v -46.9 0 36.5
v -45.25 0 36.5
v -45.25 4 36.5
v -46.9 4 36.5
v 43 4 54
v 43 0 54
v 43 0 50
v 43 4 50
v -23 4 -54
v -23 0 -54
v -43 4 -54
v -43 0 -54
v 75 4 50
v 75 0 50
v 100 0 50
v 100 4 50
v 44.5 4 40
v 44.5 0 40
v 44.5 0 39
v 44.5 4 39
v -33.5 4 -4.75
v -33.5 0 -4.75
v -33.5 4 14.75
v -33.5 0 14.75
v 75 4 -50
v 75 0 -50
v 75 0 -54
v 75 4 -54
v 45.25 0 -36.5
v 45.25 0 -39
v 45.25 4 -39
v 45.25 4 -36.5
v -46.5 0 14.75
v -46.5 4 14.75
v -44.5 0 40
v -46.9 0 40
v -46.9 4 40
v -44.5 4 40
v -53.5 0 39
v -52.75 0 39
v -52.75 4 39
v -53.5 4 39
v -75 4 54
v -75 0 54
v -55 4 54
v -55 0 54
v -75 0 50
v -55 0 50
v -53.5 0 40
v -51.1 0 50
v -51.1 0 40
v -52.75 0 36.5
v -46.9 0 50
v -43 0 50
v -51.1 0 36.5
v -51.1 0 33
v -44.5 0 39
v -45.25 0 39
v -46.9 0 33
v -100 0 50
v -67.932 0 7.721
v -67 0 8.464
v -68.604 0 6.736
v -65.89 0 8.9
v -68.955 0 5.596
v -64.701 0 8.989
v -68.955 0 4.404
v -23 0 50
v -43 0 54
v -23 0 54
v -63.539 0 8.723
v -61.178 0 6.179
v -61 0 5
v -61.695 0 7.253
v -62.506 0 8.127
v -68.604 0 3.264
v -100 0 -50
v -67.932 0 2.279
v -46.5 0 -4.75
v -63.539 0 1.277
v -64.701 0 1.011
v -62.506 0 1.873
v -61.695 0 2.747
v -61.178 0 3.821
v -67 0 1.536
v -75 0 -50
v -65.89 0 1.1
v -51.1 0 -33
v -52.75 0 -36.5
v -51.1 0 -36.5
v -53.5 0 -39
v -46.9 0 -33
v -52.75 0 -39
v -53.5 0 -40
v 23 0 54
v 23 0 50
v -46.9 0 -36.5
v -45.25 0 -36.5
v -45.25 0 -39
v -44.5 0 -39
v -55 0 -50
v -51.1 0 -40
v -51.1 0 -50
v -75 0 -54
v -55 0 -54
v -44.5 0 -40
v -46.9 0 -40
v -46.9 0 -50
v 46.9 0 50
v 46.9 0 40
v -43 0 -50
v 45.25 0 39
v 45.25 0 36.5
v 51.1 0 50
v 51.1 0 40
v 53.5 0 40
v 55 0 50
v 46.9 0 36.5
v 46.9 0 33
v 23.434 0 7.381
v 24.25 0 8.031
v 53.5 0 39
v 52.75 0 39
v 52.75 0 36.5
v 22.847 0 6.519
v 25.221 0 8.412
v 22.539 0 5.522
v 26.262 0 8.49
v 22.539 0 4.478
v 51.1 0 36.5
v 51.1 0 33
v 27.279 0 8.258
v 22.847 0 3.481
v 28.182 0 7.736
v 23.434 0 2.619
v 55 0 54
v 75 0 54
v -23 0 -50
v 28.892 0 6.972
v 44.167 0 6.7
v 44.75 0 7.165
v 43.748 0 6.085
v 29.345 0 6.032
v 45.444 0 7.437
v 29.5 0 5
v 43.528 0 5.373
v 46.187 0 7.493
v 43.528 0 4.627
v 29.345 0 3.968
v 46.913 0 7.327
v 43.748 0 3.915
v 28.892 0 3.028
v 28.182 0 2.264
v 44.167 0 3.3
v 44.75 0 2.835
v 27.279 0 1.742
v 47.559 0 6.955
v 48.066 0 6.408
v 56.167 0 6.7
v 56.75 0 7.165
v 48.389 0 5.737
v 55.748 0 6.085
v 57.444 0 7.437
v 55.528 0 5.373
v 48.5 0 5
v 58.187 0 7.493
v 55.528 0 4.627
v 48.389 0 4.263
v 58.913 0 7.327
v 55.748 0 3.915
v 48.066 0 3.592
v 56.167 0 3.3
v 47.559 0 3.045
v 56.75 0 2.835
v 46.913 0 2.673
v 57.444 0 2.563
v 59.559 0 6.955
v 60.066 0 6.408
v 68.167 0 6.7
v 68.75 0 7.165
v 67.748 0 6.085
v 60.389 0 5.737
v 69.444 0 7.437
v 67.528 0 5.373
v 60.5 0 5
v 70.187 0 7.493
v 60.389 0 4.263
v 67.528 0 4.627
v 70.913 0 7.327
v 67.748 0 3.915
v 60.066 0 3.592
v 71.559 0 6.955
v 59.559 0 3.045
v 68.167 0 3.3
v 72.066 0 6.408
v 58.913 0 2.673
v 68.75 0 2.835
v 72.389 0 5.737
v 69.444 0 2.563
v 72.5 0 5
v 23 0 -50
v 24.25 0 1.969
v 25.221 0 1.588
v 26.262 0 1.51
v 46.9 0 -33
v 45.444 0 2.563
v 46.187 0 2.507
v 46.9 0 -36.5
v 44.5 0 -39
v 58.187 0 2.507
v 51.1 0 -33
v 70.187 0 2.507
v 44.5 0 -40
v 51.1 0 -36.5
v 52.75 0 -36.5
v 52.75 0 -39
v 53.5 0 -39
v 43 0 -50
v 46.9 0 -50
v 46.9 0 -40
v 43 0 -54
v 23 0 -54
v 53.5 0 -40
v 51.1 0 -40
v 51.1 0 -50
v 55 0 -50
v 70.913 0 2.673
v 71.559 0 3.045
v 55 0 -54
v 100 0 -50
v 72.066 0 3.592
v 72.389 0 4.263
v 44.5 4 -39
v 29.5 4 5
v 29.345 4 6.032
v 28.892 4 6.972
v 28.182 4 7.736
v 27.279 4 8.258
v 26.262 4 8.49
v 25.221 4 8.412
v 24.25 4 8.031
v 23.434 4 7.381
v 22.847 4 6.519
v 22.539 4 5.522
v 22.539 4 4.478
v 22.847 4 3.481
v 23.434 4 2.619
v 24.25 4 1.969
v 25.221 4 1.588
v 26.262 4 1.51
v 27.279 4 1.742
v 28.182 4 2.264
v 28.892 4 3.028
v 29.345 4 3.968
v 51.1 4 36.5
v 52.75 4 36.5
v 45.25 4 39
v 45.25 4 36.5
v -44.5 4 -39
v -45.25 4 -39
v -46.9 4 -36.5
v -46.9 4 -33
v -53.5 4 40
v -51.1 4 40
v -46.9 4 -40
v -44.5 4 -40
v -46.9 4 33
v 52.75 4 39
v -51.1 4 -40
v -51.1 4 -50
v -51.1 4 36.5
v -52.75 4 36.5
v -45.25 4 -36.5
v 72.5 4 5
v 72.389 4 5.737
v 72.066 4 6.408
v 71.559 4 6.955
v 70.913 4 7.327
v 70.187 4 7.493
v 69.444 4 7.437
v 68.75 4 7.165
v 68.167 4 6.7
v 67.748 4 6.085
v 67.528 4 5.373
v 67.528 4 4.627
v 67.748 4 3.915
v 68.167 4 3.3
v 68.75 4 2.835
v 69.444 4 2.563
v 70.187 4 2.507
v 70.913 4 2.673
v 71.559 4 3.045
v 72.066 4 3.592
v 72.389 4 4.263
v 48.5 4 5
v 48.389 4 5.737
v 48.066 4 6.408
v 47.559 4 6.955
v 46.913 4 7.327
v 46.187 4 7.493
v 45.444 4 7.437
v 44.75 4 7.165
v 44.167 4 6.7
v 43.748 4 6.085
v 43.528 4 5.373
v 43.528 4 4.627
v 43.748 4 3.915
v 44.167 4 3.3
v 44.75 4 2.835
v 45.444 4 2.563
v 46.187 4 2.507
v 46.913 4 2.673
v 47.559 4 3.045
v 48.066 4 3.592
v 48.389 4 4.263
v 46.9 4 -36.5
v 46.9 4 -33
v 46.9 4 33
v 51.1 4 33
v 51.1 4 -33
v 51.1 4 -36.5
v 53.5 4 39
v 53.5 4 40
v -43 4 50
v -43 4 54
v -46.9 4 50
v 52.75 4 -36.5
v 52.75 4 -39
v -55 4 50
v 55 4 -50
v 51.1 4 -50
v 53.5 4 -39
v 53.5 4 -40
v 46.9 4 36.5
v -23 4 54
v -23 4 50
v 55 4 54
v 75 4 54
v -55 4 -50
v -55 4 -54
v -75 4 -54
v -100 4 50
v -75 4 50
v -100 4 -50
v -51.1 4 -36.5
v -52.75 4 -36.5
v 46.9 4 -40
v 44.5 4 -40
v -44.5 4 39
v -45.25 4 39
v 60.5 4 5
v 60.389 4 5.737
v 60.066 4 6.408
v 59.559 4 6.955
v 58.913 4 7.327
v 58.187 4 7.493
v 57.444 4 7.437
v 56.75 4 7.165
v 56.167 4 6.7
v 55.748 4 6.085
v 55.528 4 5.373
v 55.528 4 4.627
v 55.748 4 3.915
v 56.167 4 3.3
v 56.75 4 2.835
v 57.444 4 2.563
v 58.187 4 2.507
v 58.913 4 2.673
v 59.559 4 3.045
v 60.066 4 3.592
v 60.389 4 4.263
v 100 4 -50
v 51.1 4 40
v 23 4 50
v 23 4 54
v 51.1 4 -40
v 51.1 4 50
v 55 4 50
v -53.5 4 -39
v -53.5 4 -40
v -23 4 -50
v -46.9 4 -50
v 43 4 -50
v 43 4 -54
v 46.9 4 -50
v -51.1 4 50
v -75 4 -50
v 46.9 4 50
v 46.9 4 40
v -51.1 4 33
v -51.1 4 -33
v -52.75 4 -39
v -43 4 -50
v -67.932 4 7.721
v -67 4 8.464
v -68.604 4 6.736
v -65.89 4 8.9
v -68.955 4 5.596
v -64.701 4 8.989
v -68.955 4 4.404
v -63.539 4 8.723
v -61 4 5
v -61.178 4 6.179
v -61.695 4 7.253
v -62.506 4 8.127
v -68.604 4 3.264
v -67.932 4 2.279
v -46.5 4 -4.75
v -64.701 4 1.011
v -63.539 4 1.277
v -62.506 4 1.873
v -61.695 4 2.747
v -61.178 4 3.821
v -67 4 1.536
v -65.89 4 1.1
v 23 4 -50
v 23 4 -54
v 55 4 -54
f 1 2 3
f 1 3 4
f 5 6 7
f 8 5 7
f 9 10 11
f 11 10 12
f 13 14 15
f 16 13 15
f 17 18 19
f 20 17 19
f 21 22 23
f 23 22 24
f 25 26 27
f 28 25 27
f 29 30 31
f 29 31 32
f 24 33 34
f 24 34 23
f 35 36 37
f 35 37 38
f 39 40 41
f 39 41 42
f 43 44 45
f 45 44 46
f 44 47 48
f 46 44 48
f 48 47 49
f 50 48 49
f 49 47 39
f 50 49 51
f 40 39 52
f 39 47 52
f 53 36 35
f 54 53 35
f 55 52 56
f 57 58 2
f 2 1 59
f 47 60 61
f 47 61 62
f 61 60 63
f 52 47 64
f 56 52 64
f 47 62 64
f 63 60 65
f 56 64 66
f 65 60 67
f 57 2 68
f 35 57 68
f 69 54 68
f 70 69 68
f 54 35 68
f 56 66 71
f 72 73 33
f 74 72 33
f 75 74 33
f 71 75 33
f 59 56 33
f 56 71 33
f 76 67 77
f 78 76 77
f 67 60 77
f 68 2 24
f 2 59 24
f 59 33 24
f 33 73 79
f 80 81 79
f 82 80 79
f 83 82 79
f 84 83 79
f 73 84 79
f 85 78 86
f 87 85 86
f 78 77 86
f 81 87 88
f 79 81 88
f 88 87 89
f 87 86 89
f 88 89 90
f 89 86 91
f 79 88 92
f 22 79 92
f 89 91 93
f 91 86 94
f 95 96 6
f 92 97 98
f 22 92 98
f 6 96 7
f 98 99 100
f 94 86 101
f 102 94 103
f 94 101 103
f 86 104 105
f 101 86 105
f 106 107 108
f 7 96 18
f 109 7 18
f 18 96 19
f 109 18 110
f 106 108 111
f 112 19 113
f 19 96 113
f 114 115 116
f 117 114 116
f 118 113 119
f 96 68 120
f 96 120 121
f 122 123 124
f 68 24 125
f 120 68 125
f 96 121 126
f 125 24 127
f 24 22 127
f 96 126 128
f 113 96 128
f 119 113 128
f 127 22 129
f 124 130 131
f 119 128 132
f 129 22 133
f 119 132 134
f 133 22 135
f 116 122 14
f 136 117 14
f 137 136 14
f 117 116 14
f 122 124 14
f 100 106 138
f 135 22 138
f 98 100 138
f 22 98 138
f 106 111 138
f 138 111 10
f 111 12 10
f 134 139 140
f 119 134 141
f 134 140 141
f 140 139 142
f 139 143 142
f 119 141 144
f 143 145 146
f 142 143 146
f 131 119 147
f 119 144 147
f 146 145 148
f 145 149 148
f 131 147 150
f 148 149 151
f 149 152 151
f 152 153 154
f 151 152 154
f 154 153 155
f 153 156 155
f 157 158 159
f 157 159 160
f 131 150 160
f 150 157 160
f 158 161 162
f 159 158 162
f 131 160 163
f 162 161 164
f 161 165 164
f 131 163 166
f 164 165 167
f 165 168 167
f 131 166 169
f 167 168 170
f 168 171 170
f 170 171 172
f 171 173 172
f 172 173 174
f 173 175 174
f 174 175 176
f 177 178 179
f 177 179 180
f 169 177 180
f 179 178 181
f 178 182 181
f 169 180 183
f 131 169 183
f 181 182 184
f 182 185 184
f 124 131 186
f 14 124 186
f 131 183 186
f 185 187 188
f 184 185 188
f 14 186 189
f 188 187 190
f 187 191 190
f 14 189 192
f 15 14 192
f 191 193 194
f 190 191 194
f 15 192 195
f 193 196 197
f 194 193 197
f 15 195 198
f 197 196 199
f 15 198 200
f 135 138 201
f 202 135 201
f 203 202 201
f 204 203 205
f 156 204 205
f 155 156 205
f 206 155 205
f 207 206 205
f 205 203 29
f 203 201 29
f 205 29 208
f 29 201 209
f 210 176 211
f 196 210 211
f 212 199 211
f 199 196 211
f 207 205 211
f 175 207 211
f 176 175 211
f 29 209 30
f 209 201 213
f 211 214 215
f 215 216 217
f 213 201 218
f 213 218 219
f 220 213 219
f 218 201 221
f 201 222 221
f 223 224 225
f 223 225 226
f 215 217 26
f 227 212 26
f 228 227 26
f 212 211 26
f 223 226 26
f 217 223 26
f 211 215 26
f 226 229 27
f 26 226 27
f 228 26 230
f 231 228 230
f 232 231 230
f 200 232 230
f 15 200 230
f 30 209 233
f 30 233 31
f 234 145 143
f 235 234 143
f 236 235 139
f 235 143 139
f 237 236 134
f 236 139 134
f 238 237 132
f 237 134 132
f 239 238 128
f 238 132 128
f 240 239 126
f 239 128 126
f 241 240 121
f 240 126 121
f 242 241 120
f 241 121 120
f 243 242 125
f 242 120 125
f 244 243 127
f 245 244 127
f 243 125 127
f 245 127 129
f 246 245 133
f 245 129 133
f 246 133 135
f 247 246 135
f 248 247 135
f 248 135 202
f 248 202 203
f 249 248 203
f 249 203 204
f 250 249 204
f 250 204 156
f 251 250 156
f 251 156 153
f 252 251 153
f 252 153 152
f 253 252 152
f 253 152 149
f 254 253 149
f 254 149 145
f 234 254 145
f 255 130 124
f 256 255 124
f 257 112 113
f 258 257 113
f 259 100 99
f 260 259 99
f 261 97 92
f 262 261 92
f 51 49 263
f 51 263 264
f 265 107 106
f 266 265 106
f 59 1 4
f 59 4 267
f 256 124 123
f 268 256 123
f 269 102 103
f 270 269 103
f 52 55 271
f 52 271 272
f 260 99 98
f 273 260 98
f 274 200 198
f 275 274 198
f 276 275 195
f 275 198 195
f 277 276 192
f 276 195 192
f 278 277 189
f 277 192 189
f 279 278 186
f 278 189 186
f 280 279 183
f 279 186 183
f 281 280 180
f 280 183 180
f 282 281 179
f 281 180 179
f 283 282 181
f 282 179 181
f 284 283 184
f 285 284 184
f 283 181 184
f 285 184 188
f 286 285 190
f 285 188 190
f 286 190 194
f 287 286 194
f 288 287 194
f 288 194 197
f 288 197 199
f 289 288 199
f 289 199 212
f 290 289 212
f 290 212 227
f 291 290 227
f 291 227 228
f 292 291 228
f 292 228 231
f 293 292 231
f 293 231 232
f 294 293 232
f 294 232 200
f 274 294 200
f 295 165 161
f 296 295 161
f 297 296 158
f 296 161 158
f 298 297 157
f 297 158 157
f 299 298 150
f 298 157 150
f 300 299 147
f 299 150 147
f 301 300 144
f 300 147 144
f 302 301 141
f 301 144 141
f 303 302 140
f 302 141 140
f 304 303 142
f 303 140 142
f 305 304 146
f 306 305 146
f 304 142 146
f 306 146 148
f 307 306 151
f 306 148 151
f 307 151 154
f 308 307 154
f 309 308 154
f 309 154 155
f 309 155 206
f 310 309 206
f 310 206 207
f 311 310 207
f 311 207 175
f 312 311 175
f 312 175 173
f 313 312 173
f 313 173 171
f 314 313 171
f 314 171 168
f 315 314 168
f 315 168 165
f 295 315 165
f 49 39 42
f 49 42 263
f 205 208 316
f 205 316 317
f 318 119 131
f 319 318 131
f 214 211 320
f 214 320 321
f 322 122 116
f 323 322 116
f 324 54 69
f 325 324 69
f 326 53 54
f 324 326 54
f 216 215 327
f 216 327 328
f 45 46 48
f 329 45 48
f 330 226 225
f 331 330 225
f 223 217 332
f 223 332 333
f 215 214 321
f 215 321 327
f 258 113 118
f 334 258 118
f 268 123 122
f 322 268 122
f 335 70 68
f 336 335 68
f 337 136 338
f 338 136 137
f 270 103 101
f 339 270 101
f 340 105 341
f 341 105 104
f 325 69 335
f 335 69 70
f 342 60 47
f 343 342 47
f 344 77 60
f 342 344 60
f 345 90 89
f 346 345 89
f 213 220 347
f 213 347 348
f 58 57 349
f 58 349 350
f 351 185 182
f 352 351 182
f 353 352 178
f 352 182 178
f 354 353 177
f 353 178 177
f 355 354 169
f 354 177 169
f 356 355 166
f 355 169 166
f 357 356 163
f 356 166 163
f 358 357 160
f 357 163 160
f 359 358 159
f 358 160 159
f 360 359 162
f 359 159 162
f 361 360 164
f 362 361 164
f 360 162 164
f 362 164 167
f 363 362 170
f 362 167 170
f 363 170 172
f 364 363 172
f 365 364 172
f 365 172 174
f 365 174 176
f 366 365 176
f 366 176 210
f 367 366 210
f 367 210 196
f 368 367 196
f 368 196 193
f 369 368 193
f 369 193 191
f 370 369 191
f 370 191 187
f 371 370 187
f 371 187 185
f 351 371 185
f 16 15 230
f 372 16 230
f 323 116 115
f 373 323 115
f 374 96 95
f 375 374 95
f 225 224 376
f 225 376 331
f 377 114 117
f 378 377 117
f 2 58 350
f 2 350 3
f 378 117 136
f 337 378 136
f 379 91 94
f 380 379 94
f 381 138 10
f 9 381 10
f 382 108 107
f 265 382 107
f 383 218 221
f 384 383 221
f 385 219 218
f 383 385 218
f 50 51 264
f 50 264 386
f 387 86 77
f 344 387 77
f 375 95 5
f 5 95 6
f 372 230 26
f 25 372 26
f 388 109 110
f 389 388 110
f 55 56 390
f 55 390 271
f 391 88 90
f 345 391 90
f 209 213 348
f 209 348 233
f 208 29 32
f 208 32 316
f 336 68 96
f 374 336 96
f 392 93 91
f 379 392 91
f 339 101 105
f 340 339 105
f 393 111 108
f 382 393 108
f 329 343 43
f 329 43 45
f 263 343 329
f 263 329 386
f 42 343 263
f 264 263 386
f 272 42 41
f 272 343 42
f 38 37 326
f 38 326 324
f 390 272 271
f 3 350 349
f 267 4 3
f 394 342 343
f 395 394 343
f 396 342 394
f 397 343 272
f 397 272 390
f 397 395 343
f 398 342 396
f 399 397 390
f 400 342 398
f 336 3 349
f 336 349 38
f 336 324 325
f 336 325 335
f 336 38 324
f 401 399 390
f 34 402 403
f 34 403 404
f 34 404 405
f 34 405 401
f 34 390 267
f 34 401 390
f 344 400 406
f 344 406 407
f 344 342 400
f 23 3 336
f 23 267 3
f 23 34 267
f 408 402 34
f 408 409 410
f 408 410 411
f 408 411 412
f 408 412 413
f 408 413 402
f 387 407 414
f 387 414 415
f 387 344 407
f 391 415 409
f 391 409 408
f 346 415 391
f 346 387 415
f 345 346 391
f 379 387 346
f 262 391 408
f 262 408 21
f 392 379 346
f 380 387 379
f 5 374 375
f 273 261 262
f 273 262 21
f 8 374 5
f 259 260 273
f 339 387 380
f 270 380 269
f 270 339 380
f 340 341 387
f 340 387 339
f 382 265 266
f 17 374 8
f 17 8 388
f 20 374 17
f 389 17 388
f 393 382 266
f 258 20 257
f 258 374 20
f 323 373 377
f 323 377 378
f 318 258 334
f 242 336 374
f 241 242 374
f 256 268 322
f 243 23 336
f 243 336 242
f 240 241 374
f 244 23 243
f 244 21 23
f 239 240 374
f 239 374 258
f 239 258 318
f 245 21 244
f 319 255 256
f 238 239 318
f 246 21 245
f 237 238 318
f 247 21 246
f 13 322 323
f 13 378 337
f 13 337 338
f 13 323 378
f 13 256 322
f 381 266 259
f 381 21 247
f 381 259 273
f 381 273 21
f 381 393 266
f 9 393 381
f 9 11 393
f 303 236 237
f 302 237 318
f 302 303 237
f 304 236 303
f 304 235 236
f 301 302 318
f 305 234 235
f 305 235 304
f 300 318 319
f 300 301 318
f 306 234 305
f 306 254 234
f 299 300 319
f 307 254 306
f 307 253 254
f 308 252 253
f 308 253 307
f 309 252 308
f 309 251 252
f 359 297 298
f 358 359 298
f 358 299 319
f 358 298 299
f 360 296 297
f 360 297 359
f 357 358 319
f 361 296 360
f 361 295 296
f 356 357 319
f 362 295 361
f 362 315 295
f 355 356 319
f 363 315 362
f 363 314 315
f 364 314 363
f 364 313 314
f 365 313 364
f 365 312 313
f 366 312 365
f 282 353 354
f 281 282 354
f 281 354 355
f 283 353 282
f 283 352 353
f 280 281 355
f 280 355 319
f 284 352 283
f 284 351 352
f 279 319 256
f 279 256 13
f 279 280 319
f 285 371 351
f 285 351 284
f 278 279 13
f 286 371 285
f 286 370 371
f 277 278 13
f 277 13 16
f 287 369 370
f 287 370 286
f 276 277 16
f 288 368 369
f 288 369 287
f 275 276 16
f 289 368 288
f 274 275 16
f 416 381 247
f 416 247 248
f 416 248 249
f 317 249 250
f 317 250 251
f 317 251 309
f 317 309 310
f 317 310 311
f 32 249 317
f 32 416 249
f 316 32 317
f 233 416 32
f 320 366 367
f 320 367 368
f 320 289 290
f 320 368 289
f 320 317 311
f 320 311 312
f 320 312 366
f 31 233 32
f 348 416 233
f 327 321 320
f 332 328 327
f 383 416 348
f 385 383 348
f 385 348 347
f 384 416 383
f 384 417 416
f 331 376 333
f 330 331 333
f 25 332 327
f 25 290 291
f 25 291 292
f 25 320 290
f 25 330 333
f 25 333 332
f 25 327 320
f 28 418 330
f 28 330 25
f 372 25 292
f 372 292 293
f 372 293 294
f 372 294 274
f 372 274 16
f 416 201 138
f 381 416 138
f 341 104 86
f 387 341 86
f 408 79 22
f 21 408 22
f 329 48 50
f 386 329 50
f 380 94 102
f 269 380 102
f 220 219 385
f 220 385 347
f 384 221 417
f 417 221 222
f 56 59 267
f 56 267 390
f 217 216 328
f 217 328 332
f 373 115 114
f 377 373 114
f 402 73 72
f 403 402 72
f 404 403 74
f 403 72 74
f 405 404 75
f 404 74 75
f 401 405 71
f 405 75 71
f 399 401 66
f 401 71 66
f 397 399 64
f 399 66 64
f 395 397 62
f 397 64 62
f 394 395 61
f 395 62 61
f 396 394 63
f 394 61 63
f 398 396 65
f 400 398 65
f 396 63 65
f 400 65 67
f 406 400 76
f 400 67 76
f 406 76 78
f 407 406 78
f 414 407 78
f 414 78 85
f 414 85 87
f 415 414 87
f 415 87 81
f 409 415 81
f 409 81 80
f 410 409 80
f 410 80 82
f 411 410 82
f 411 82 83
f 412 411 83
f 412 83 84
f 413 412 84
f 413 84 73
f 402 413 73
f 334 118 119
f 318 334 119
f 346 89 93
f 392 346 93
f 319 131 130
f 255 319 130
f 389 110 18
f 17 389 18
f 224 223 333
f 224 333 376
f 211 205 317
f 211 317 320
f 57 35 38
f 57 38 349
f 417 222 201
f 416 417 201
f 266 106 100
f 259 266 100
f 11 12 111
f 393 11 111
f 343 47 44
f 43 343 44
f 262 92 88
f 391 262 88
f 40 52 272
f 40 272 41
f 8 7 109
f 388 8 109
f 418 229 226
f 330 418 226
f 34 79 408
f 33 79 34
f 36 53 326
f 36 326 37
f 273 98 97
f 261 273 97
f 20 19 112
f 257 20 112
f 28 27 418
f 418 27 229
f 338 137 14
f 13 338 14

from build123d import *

# Parameters (mm, degrees)
BOSS_EXTRUDE1_DEPTH = 4
SKETCH2_R           = 4
SKETCH2_R_2         = 3.5
SKETCH2_R_3         = 2.5
SKETCH2_W           = 13
SKETCH2_H           = 19.5
CUT_EXTRUDE1_DEPTH  = 5
CUT_EXTRUDE2_DEPTH  = 6


with BuildPart() as part:
    # Sketch1 → Boss-Extrude1 (new body)
    with BuildSketch(Plane(origin=(0, 0, 0), x_dir=(1, 0, 0), z_dir=(0, 1, 0))):
        Polygon((-55, -50), (-43, -50), (-43, -54), (-23, -54), (-23, -50), (23, -50), (23, -54), (43, -54), (43, -50), (55, -50), (55, -54), (75, -54), (75, -50), (100, -50), (100, 50), (75, 50), (75, 54), (55, 54), (55, 50), (43, 50), (43, 54), (23, 54), (23, 50), (-23, 50), (-23, 54), (-43, 54), (-43, 50), (-55, 50), (-55, 54), (-75, 54), (-75, 50), (-100, 50), (-100, -50), (-75, -50), (-75, -54), (-55, -54), align=None)
    extrude(amount=BOSS_EXTRUDE1_DEPTH)

    # Sketch2 → Cut-Extrude1 (cut, through all)
    with BuildSketch(Plane.XZ):
        with Locations((-65, 5)):
            Circle(SKETCH2_R)
        with Locations((26, 5)):
            Circle(SKETCH2_R_2)
        with Locations((46, 5)):
            Circle(SKETCH2_R_3)
        with Locations((58, 5)):
            Circle(SKETCH2_R_3)
        with Locations((70, 5)):
            Circle(SKETCH2_R_3)
        with Locations((-40, 5)):
            Rectangle(SKETCH2_W, SKETCH2_H)
    extrude(amount=-CUT_EXTRUDE1_DEPTH, mode=Mode.SUBTRACT)

    # Sketch3 → Cut-Extrude2 (cut)
    with BuildSketch(Plane.XZ):
        Polygon((-51.1, -50), (-46.9, -50), (-46.9, -40), (-44.5, -40), (-44.5, -39), (-45.25, -39), (-45.25, -36.5), (-46.9, -36.5), (-46.9, -33), (-51.1, -33), (-51.1, -36.5), (-52.75, -36.5), (-52.75, -39), (-53.5, -39), (-53.5, -40), (-51.1, -40), align=None)
        Polygon((46.9, -50), (46.9, -40), (44.5, -40), (44.5, -39), (45.25, -39), (45.25, -36.5), (46.9, -36.5), (46.9, -33), (51.1, -33), (51.1, -36.5), (52.75, -36.5), (52.75, -39), (53.5, -39), (53.5, -40), (51.1, -40), (51.1, -50), align=None)
    cut_extrude2 = extrude(amount=-CUT_EXTRUDE2_DEPTH, mode=Mode.SUBTRACT)

    # Mirror1: Cut-Extrude2 across plane
    add(cut_extrude2.mirror(Plane.XY), mode=Mode.SUBTRACT)


solid = part.part
